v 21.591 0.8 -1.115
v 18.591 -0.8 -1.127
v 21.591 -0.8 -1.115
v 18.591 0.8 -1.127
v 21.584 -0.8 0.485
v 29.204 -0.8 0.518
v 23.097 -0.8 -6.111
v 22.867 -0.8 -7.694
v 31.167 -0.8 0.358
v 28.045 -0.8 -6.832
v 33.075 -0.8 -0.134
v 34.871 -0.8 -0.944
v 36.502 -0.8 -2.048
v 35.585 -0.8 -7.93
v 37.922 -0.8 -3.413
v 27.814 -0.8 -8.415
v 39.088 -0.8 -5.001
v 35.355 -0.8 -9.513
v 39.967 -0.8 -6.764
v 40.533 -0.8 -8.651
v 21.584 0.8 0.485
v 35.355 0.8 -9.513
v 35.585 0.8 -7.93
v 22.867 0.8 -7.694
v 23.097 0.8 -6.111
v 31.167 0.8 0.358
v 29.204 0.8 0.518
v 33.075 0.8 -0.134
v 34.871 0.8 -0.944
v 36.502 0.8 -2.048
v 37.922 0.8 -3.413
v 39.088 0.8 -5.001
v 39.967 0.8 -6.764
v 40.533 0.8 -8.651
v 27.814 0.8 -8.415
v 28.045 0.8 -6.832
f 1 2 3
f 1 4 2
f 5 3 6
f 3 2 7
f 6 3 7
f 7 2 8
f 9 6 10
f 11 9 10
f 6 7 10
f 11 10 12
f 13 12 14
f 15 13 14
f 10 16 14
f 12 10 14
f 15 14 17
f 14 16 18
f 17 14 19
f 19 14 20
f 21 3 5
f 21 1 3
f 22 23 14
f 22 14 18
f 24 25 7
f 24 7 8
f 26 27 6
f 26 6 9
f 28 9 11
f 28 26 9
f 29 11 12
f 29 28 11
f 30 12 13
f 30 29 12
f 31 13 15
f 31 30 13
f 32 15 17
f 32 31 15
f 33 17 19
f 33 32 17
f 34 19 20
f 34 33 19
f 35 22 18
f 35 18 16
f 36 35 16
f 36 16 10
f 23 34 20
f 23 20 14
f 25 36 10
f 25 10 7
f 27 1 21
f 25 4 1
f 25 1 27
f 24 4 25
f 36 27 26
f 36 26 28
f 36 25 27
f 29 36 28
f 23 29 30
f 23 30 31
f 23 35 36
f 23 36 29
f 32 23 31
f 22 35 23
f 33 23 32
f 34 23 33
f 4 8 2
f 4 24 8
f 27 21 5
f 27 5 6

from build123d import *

# Parameters (mm, degrees)
P_IDAT_VYSUNUT_M1_DEPTH = 0.8


with BuildPart() as part:
    # Skica1 → Přidat vysunutím1 (new, symmetric)
    with BuildSketch(Plane(origin=(0, 0, 0), x_dir=(1, 0, 0), z_dir=(0, 1, 0))):
        with BuildLine():
            Line((21.590966819, 1.114633571), (21.584116759, -0.485351766))
            Line((21.584116759, -0.485351766), (29.204046923, -0.517975177))
            ThreePointArc((29.204046923, -0.517975177), (36.502348534, 2.047731055), (40.53322014, 8.650770428))
            Line((40.53322014, 8.650770428), (35.585436473, 7.930050796))
            Line((35.585436473, 7.930050796), (35.354806191, 9.513341569))
            Line((35.354806191, 9.513341569), (27.814383883, 8.41496485))
            Line((27.814383883, 8.41496485), (28.045014165, 6.831674076))
            Line((28.045014165, 6.831674076), (23.097230499, 6.110954444))
            Line((23.097230499, 6.110954444), (22.866600217, 7.694245217))
            Line((22.866600217, 7.694245217), (18.590994313, 1.127477433))
            Line((18.590994313, 1.127477433), (21.590966819, 1.114633571))
        make_face()
    extrude(amount=P_IDAT_VYSUNUT_M1_DEPTH, both=True)


solid = part.part
